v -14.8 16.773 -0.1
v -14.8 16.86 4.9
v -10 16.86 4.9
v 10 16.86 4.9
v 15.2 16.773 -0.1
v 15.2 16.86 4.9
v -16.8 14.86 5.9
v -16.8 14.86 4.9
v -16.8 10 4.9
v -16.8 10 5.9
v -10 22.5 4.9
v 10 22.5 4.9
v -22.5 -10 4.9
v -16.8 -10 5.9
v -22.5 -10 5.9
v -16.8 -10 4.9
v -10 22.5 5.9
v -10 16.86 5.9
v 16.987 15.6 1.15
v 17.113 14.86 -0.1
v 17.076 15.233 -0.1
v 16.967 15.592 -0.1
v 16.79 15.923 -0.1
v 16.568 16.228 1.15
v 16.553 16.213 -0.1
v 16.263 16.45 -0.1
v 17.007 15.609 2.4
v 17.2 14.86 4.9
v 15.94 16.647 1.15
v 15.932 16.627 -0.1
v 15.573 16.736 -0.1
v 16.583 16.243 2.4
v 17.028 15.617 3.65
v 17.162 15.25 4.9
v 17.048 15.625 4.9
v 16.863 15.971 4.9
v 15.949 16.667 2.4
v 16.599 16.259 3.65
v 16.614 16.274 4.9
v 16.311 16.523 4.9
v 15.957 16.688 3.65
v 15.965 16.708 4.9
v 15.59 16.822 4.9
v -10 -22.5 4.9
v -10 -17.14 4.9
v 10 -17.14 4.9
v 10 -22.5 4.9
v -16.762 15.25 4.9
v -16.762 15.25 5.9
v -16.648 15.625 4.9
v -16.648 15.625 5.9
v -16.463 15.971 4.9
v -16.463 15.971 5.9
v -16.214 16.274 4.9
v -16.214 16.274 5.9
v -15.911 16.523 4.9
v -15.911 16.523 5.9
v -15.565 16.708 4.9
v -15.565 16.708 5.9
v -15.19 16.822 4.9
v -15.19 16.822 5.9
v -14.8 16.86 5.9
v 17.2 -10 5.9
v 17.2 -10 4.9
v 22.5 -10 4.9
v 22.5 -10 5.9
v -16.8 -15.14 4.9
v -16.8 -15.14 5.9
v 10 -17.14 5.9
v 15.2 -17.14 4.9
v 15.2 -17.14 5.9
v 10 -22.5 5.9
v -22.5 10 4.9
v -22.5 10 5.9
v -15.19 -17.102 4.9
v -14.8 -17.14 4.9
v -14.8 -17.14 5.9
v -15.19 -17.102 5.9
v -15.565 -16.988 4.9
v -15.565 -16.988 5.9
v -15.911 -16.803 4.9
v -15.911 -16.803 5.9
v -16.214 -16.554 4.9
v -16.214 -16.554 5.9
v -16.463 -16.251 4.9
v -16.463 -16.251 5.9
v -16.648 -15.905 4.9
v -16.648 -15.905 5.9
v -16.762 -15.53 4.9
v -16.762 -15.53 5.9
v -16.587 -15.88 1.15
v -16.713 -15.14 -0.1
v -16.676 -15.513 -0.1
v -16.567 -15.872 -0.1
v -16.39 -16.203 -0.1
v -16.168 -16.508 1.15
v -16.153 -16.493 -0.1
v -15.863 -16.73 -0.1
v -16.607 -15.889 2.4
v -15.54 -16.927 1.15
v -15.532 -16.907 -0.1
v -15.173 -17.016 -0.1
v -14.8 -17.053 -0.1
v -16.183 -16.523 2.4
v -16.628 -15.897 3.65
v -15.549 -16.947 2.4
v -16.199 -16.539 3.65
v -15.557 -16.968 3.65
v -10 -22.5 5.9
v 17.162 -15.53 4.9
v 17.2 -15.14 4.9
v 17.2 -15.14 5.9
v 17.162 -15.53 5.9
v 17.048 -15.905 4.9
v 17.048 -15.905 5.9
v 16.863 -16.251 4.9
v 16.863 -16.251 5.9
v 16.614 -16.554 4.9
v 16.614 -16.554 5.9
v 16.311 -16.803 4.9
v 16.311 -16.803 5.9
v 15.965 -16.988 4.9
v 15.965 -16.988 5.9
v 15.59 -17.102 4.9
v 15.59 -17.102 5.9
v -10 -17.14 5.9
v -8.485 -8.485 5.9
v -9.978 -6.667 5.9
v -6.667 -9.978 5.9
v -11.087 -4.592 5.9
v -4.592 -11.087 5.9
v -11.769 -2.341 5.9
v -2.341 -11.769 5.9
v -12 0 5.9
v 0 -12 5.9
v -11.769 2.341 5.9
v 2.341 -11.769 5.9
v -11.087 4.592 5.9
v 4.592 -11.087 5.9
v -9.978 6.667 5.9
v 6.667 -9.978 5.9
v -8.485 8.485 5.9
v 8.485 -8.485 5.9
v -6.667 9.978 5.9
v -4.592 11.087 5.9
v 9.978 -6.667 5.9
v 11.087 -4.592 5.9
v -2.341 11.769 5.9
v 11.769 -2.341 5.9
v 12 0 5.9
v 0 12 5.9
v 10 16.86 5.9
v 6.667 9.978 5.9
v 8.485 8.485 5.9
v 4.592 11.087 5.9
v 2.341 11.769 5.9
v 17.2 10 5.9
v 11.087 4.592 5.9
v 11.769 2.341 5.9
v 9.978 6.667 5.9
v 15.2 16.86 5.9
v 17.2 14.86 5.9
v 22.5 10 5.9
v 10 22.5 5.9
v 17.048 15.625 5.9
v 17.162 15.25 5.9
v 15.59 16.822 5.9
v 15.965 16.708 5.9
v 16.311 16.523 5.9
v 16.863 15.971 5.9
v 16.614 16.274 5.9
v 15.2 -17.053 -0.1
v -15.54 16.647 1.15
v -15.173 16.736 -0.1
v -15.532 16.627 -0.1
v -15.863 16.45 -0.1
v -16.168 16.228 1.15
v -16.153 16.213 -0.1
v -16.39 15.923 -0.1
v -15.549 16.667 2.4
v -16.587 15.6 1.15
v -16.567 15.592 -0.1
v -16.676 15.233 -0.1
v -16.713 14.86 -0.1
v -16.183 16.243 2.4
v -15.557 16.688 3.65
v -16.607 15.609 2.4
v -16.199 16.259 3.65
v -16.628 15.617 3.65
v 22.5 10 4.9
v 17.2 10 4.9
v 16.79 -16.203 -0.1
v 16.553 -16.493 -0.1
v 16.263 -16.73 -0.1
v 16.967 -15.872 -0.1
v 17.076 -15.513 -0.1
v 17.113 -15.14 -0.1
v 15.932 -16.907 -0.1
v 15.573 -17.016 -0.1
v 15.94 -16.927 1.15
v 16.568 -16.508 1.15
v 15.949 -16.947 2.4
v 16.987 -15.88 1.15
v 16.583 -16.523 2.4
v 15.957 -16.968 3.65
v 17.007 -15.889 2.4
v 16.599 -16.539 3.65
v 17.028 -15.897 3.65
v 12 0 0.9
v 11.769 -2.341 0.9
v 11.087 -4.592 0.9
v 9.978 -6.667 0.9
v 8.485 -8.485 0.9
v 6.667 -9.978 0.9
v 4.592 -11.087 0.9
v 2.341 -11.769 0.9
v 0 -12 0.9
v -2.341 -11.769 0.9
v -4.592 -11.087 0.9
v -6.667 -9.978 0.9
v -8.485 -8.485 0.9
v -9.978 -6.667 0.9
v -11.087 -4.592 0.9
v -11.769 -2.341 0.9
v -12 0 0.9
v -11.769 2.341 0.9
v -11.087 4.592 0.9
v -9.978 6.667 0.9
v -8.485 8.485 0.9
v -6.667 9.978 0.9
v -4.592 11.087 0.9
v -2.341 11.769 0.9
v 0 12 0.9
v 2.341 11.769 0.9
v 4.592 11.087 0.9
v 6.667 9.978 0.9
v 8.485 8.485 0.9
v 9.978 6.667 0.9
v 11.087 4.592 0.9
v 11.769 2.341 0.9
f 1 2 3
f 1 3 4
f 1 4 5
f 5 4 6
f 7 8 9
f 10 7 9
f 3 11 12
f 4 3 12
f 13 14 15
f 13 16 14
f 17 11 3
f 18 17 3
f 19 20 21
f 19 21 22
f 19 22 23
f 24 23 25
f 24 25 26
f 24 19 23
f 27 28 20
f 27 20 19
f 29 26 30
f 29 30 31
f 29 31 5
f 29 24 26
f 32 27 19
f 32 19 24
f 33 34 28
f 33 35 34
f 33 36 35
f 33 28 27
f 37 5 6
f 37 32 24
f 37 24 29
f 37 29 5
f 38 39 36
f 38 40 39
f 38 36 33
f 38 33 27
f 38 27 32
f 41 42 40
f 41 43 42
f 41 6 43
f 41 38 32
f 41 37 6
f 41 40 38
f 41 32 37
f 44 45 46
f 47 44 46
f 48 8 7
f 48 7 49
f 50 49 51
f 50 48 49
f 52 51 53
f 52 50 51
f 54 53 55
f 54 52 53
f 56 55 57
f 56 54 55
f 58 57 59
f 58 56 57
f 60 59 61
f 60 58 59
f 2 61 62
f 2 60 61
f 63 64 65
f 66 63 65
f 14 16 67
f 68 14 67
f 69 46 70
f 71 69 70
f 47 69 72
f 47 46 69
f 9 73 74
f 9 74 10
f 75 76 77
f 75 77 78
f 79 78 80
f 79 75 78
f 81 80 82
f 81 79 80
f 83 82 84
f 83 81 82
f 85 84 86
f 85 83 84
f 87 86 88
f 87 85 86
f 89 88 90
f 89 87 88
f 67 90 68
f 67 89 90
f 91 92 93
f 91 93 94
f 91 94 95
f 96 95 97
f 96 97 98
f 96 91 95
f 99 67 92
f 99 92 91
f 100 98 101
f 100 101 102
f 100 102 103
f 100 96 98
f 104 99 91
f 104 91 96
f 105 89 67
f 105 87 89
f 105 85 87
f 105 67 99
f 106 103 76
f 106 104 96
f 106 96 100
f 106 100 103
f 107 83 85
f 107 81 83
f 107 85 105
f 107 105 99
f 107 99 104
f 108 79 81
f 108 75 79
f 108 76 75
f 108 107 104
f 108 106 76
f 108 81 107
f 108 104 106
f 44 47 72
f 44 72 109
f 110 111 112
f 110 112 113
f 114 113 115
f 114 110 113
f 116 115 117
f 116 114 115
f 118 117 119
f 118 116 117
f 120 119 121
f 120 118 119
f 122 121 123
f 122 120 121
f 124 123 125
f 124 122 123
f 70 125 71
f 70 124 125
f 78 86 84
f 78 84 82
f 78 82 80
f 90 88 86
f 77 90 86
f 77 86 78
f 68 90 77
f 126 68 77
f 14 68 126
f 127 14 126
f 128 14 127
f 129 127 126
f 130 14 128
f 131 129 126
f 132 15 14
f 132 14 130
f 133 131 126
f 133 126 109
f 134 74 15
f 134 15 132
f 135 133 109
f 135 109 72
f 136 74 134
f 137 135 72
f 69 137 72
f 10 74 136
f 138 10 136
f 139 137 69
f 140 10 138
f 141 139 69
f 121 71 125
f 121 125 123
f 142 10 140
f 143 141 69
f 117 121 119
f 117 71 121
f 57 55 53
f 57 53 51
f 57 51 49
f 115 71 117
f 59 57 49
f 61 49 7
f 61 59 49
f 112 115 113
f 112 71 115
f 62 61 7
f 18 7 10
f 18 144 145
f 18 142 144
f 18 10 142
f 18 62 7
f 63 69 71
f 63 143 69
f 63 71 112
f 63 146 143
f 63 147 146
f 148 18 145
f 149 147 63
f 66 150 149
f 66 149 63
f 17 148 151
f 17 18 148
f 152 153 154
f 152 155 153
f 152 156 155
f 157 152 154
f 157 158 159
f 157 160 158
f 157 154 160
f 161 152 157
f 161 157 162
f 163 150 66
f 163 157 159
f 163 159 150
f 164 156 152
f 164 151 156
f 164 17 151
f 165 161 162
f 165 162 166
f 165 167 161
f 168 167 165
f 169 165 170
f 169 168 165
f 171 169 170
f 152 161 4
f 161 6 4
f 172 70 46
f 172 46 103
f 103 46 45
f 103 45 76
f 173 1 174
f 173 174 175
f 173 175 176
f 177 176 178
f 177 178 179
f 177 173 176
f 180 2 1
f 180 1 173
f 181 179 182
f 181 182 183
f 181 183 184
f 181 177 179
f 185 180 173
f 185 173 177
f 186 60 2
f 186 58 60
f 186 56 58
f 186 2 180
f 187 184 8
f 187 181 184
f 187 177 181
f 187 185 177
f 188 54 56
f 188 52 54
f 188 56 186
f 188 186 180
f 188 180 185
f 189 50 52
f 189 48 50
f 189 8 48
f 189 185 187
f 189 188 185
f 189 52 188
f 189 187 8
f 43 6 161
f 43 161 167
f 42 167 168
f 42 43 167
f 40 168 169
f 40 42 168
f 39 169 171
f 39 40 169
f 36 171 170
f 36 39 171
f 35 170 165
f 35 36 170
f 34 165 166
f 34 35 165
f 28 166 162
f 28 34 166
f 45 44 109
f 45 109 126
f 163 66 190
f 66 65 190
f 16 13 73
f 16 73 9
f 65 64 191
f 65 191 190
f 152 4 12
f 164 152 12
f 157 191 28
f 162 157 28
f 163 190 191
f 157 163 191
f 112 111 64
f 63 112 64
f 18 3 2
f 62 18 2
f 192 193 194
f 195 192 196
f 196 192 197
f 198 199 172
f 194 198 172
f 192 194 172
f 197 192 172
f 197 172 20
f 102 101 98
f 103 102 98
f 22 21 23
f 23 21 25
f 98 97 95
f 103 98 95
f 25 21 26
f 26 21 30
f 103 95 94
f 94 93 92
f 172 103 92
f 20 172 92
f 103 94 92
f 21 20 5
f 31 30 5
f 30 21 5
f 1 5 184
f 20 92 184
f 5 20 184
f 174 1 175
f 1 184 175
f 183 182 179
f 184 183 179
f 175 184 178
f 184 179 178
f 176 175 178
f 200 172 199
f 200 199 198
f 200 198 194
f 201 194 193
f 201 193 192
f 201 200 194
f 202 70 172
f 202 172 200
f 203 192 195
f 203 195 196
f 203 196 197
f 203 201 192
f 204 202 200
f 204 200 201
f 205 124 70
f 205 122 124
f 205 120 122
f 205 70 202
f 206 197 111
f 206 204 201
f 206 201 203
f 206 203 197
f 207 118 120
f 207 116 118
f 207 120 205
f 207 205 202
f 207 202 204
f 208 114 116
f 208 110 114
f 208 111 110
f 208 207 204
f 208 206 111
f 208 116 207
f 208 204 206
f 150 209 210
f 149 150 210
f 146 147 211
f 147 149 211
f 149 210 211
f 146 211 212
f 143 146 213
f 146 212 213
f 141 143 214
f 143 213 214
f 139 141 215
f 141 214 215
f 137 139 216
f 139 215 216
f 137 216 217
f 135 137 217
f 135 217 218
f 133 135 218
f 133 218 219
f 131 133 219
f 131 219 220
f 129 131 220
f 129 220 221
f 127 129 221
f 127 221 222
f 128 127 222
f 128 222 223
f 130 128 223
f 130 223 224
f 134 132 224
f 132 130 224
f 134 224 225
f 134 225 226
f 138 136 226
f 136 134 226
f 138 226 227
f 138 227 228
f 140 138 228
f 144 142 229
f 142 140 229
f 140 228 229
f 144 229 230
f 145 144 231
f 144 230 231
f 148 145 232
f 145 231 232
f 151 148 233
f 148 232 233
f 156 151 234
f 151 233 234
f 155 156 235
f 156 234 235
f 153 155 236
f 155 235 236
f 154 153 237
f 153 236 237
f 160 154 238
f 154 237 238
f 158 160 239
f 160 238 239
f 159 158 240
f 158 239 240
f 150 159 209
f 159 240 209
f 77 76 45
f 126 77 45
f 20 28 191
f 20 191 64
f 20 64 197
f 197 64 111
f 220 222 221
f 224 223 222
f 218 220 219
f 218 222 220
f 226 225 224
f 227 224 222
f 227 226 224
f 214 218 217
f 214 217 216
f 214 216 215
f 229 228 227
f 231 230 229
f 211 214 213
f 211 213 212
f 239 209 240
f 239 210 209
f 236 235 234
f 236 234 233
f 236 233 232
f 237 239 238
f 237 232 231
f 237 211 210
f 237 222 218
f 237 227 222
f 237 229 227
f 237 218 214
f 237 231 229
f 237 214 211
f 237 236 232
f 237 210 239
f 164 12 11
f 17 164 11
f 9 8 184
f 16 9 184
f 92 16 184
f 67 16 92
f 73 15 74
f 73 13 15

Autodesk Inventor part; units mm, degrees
ref_plane "YZ Plane" through (0, 0, 0) normal (1, 0, 0) x (0, 1, 0)
ref_plane "XZ Plane" through (0, 0, 0) normal (0, 1, 0) x (-1, 0, 0)
ref_plane "XY Plane" through (0, 0, 0) normal (0, 0, 1) x (1, 0, 0)
ref_plane "Work Plane1" through (15.4052, 15.0652, 4.9) normal (0, 0, 1) x (0, 1, 0)
sketch "Sketch1" plane through (15.4052, 15.0652, 4.9) normal (0, 0, 1) x (0, 1, 0)
  circle A0 centre (5.7948, 15.4052) radius 2.5 projected
  circle A1 centre (-15.6052, -5.7948) radius 2.5 projected
  line L0 (-20.0856, 39.0762) -> (-20.0856, 40.2052) projected
  line L1 (-20.0856, 40.2052) -> (-38.2052, 40.2052) projected
  arc A2 (-38.2052, 40.2052) -> (-40.2052, 38.2052) centre (-38.2052, 38.2052) ccw projected
  line L2 (-40.2052, 20.2953) -> (-40.2052, 38.2052) projected
  line L3 (-40.2052, 20.2953) -> (-39.0783, 20.2953) projected
  arc A3 (-39.0783, 20.2953) -> (-38.6768, 20.6232) centre (-39.0783, 20.7051) ccw projected
  arc A4 (-34.5391, 20.2052) -> (-38.6768, 20.6232) centre (-36.6291, 20.2052) ccw projected
  line L4 (-34.5391, 20.2052) -> (-34.5391, 10.4067) projected
  arc A5 (-38.647, 9.8643) -> (-34.5391, 10.4067) centre (-36.6023, 10.2052) ccw projected
  line L5 (-38.647, 9.8643) -> (-38.6775, 9.9849) projected
  arc A6 (-38.6775, 9.9849) -> (-39.0762, 10.3249) centre (-39.083, 9.9131) ccw projected
  line L6 (-39.0762, 10.3249) -> (-40.2052, 10.3249) projected
  line L7 (-40.2052, -7.7948) -> (-40.2052, 10.3249) projected
  arc A7 (-40.2052, -7.7948) -> (-38.2052, -9.7948) centre (-38.2052, -7.7948) ccw projected
  line L8 (-38.2052, -9.7948) -> (-20.2052, -9.7948) projected
  line L9 (-20.2052, -9.7948) -> (-20.2052, -10.8453) projected
  arc A8 (-20.6052, -11.3352) -> (-20.2052, -10.8453) centre (-20.7052, -10.8453) ccw projected
  arc A9 (-20.6052, -11.3352) -> (-20.2052, -15.2948) centre (-20.2052, -13.2948) ccw projected
  line L10 (-20.2052, -15.2948) -> (-10.2052, -15.2948) projected
  arc A10 (-10.2052, -15.2948) -> (-9.8052, -11.3352) centre (-10.2052, -13.2948) ccw projected
  arc A11 (-10.2052, -10.8453) -> (-9.8052, -11.3352) centre (-9.7052, -10.8453) ccw projected
  line L11 (-10.2052, -10.8453) -> (-10.2052, -9.7948) projected
  line L12 (-10.2052, -9.7948) -> (7.7948, -9.7948) projected
  arc A12 (7.7948, -9.7948) -> (9.7948, -7.7948) centre (7.7948, -7.7948) ccw projected
  line L13 (9.7948, 10.2052) -> (9.7948, -7.7948) projected
  line L14 (9.7948, 10.2052) -> (10.8453, 10.2052) projected
  arc A13 (11.3352, 9.8052) -> (10.8453, 10.2052) centre (10.8453, 9.7052) ccw projected
  arc A14 (11.3352, 9.8052) -> (15.2948, 10.2052) centre (13.2948, 10.2052) ccw projected
  line L15 (15.2948, 10.2052) -> (15.2948, 20.2052) projected
  arc A15 (15.2948, 20.2052) -> (11.3352, 20.6052) centre (13.2948, 20.2052) ccw projected
  arc A16 (10.8453, 20.2052) -> (11.3352, 20.6052) centre (10.8453, 20.7052) ccw projected
  line L16 (10.8453, 20.2052) -> (9.7948, 20.2052) projected
  line L17 (9.7948, 38.2052) -> (9.7948, 20.2052) projected
  arc A17 (9.7948, 38.2052) -> (7.7948, 40.2052) centre (7.7948, 38.2052) ccw projected
  line L18 (7.7948, 40.2052) -> (-10.1151, 40.2052) projected
  line L19 (-10.1151, 40.2052) -> (-10.1151, 39.0783) projected
  arc A18 (-10.1151, 39.0783) -> (-9.7873, 38.6768) centre (-9.7054, 39.0783) ccw projected
  arc A19 (-10.2052, 34.5391) -> (-9.7873, 38.6768) centre (-10.2052, 36.6291) ccw projected
  line L20 (-10.2052, 34.5391) -> (-20.0038, 34.5391) projected
  arc A20 (-20.5462, 38.647) -> (-20.0038, 34.5391) centre (-20.2052, 36.6023) ccw projected
  line L21 (-20.5462, 38.647) -> (-20.4256, 38.6775) projected
  arc A21 (-20.4256, 38.6775) -> (-20.0856, 39.0762) centre (-20.4974, 39.083) ccw projected
  line L22 (-0.2052, 32.2052) -> (-30.2052, 32.2052) projected
  arc A22 (1.7948, 30.2052) -> (-0.2052, 32.2052) centre (-0.2052, 30.2052) ccw projected
  line L23 (1.7948, 30.2052) -> (1.7948, 0.2052) projected
  arc A23 (-0.2052, -1.7948) -> (1.7948, 0.2052) centre (-0.2052, 0.2052) ccw projected
  line L24 (-0.2052, -1.7948) -> (-30.2052, -1.7948) projected
  arc A24 (-32.2052, 0.2052) -> (-30.2052, -1.7948) centre (-30.2052, 0.2052) ccw projected
  line L25 (-32.2052, 0.2052) -> (-32.2052, 30.2052) projected
  arc A25 (-30.2052, 32.2052) -> (-32.2052, 30.2052) centre (-30.2052, 30.2052) ccw projected
  circle A26 centre (-35.2052, 35.2052) radius 2.425 projected
  circle A27 centre (-29.7052, 36.0052) radius 2.65 projected
  circle A28 centre (-36.0052, 29.7052) radius 2.65 projected
  circle A29 centre (-35.2052, -4.7948) radius 2.425 projected
  circle A30 centre (-29.7052, -5.5948) radius 2.65 projected
  circle A31 centre (-36.0052, 0.7052) radius 2.65 projected
  circle A32 centre (4.7948, 35.2052) radius 2.425 projected
  circle A33 centre (-0.7052, 36.0052) radius 2.65 projected
  circle A34 centre (5.5948, 29.7052) radius 2.65 projected
  circle A35 centre (5.5948, 0.7052) radius 2.65 projected
  circle A36 centre (-0.7052, -5.5948) radius 2.65 projected
  circle A37 centre (4.7948, -4.7948) radius 2.425 projected
  point P0 (-15.0652, 15.4052)
extrude "Extrusion1" add sketch "Sketch1" against normal blind 5 draft -1 contours A22 L23 A23 L24 A24 L25 A25 L22
sketch "Sketch2" plane through (15.4052, 15.0652, 4.9) normal (0, 0, 1) x (1, 0, 0)
  circle A0 centre (-26.2552, -7.0652) radius 3 projected
  circle A1 centre (-26.2552, -23.0652) radius 3 projected
  circle A2 centre (-4.2552, -15.0652) radius 1.6 projected
  line L0 (-50.1952, -15.0652) -> (19.3848, -15.0652)
  circle A3 centre (-15.4052, -15.0652) radius 12
  dimension "d4" = 24
extrude "Extrusion2" cut sketch "Sketch2" against normal blind 4 contours A0 A3 | A0 A3 A2 L0 | A3 L0 A2 | L0 A2 A3 A1 | L0 A3 A2 | A1 A3 picked at (-24.6691, -8.292) picked at (-4.1694, -14.672) picked at (-4.1694, -15.4584) picked at (-24.6691, -21.8384)
sketch "Sketch4" plane through (15.4052, 15.0652, 4.9) normal (0, 0, 1) x (1, 0, 0)
  circle A0 centre (-15.4052, -15.0652) radius 12 construction
  line L0 (-32.2052, -0.2052) -> (-32.2052, -30.2052) construction
  arc A1 (-32.2052, -30.2052) -> (-30.2052, -32.2052) centre (-30.2052, -30.2052) ccw construction
  line L1 (-30.2052, -32.2052) -> (-0.2052, -32.2052) construction
  arc A2 (-0.2052, -32.2052) -> (1.7948, -30.2052) centre (-0.2052, -30.2052) ccw construction
  line L2 (1.7948, -30.2052) -> (1.7948, -0.2052) construction
  arc A3 (1.7948, -0.2052) -> (-0.2052, 1.7948) centre (-0.2052, -0.2052) ccw construction
  line L3 (-0.2052, 1.7948) -> (-30.2052, 1.7948) construction
  arc A4 (-30.2052, 1.7948) -> (-32.2052, -0.2052) centre (-30.2052, -0.2052) ccw construction
  line L4 (-37.9052, -25.0652) -> (7.0948, -25.0652) construction
  line L5 (7.0948, -25.0652) -> (7.0948, -5.0652) construction
  line L6 (7.0948, -5.0652) -> (-37.9052, -5.0652) construction
  line L7 (-37.9052, -5.0652) -> (-37.9052, -25.0652) construction
  line L8 (-37.9052, -25.0652) -> (7.0948, -5.0652) construction
  line L9 (7.0948, -25.0652) -> (-37.9052, -5.0652) construction
  line L10 (-25.4052, 7.4348) -> (-5.4052, 7.4348) construction
  line L11 (-5.4052, 7.4348) -> (-5.4052, -37.5652) construction
  line L12 (-5.4052, -37.5652) -> (-25.4052, -37.5652) construction
  line L13 (-25.4052, -37.5652) -> (-25.4052, 7.4348) construction
  line L14 (-25.4052, 7.4348) -> (-5.4052, -37.5652) construction
  line L15 (-5.4052, 7.4348) -> (-25.4052, -37.5652) construction
  line L16 (1.7075, -30.2052) -> (1.7075, -0.2052) construction
  line L17 (-30.2052, -32.2052) -> (-0.2052, -32.2052) construction
  line L18 (-32.118, -0.2052) -> (-32.118, -30.2052) construction
  line L19 (-0.2052, 1.7948) -> (-30.2052, 1.7948) construction
  line L20 (7.0948, -5.0652) -> (1.7075, -5.0652)
  line L21 (1.7075, -5.0652) -> (1.7075, -25.0652)
  line L22 (1.7075, -25.0652) -> (7.0948, -25.0652)
  line L23 (7.0948, -25.0652) -> (7.0948, -5.0652)
  line L24 (-5.4052, -37.5652) -> (-25.4052, -37.5652)
  line L25 (-25.4052, -37.5652) -> (-25.4052, -32.2052)
  line L26 (-25.4052, -32.2052) -> (-5.4052, -32.2052)
  line L27 (-5.4052, -32.2052) -> (-5.4052, -37.5652)
  line L28 (-32.2052, -25.0652) -> (-37.9052, -25.0652)
  line L29 (-37.9052, -25.0652) -> (-37.9052, -5.0652)
  line L30 (-37.9052, -5.0652) -> (-32.2052, -5.0652)
  line L31 (-32.2052, -5.0652) -> (-32.2052, -25.0652)
  line L32 (-25.4052, 1.7948) -> (-5.4052, 1.7948)
  line L33 (-5.4052, 1.7948) -> (-5.4052, 7.4348)
  line L34 (-5.4052, 7.4348) -> (-25.4052, 7.4348)
  line L35 (-25.4052, 7.4348) -> (-25.4052, 1.7948)
  point P0 (1.7948, -5.0652)
  point P1 (-5.4052, -32.2052)
  point P2 (-32.118, -5.0652)
  point P3 (-5.4052, 1.7948)
  dimension "d7" = 45
  dimension "d8" = 20
  dimension "d9" = 20
  dimension "d10" = 45
extrude "Extrusion4" add sketch "Sketch4" along normal blind 1
sketch "Sketch5" plane through (15.4052, 15.0652, 4.9) normal (0, 0, 1) x (1, 0, 0)
  line L0 (1.7075, -5.0652) -> (1.7948, -5.0652) projected
  line L1 (1.7948, -5.0652) -> (1.7948, -0.2052) projected
  arc A0 (1.7948, -0.2052) -> (-0.2052, 1.7948) centre (-0.2052, -0.2052) ccw projected
  line L2 (-0.2052, 1.7948) -> (-5.4052, 1.7948) projected
  line L3 (-5.4052, 1.7948) -> (-25.4052, 1.7948) projected
  line L4 (-25.4052, 1.7948) -> (-30.2052, 1.7948) projected
  arc A1 (-30.2052, 1.7948) -> (-32.2052, -0.2052) centre (-30.2052, -0.2052) ccw projected
  line L5 (-32.2052, -0.2052) -> (-32.2052, -5.0652) projected
  line L6 (-32.2052, -5.0652) -> (-32.2052, -25.0652) projected
  line L7 (-32.2052, -25.0652) -> (-32.2052, -30.2052) projected
  arc A2 (-32.2052, -30.2052) -> (-30.2052, -32.2052) centre (-30.2052, -30.2052) ccw projected
  line L8 (-30.2052, -32.2052) -> (-25.4052, -32.2052) projected
  line L9 (-25.4052, -32.2052) -> (-5.4052, -32.2052) projected
  line L10 (-5.4052, -32.2052) -> (-0.2052, -32.2052) projected
  arc A3 (-0.2052, -32.2052) -> (1.7948, -30.2052) centre (-0.2052, -30.2052) ccw projected
  line L11 (1.7948, -30.2052) -> (1.7948, -25.0652) projected
  line L12 (1.7948, -25.0652) -> (1.7075, -25.0652) projected
  line L13 (1.7075, -25.0652) -> (1.7075, -5.0652) projected
  circle A4 centre (-15.4052, -15.0652) radius 12 projected
extrude "Extrusion5" add sketch "Sketch5" along normal blind 1
properties part number "30_Cube_counterplate_LEDmount"
